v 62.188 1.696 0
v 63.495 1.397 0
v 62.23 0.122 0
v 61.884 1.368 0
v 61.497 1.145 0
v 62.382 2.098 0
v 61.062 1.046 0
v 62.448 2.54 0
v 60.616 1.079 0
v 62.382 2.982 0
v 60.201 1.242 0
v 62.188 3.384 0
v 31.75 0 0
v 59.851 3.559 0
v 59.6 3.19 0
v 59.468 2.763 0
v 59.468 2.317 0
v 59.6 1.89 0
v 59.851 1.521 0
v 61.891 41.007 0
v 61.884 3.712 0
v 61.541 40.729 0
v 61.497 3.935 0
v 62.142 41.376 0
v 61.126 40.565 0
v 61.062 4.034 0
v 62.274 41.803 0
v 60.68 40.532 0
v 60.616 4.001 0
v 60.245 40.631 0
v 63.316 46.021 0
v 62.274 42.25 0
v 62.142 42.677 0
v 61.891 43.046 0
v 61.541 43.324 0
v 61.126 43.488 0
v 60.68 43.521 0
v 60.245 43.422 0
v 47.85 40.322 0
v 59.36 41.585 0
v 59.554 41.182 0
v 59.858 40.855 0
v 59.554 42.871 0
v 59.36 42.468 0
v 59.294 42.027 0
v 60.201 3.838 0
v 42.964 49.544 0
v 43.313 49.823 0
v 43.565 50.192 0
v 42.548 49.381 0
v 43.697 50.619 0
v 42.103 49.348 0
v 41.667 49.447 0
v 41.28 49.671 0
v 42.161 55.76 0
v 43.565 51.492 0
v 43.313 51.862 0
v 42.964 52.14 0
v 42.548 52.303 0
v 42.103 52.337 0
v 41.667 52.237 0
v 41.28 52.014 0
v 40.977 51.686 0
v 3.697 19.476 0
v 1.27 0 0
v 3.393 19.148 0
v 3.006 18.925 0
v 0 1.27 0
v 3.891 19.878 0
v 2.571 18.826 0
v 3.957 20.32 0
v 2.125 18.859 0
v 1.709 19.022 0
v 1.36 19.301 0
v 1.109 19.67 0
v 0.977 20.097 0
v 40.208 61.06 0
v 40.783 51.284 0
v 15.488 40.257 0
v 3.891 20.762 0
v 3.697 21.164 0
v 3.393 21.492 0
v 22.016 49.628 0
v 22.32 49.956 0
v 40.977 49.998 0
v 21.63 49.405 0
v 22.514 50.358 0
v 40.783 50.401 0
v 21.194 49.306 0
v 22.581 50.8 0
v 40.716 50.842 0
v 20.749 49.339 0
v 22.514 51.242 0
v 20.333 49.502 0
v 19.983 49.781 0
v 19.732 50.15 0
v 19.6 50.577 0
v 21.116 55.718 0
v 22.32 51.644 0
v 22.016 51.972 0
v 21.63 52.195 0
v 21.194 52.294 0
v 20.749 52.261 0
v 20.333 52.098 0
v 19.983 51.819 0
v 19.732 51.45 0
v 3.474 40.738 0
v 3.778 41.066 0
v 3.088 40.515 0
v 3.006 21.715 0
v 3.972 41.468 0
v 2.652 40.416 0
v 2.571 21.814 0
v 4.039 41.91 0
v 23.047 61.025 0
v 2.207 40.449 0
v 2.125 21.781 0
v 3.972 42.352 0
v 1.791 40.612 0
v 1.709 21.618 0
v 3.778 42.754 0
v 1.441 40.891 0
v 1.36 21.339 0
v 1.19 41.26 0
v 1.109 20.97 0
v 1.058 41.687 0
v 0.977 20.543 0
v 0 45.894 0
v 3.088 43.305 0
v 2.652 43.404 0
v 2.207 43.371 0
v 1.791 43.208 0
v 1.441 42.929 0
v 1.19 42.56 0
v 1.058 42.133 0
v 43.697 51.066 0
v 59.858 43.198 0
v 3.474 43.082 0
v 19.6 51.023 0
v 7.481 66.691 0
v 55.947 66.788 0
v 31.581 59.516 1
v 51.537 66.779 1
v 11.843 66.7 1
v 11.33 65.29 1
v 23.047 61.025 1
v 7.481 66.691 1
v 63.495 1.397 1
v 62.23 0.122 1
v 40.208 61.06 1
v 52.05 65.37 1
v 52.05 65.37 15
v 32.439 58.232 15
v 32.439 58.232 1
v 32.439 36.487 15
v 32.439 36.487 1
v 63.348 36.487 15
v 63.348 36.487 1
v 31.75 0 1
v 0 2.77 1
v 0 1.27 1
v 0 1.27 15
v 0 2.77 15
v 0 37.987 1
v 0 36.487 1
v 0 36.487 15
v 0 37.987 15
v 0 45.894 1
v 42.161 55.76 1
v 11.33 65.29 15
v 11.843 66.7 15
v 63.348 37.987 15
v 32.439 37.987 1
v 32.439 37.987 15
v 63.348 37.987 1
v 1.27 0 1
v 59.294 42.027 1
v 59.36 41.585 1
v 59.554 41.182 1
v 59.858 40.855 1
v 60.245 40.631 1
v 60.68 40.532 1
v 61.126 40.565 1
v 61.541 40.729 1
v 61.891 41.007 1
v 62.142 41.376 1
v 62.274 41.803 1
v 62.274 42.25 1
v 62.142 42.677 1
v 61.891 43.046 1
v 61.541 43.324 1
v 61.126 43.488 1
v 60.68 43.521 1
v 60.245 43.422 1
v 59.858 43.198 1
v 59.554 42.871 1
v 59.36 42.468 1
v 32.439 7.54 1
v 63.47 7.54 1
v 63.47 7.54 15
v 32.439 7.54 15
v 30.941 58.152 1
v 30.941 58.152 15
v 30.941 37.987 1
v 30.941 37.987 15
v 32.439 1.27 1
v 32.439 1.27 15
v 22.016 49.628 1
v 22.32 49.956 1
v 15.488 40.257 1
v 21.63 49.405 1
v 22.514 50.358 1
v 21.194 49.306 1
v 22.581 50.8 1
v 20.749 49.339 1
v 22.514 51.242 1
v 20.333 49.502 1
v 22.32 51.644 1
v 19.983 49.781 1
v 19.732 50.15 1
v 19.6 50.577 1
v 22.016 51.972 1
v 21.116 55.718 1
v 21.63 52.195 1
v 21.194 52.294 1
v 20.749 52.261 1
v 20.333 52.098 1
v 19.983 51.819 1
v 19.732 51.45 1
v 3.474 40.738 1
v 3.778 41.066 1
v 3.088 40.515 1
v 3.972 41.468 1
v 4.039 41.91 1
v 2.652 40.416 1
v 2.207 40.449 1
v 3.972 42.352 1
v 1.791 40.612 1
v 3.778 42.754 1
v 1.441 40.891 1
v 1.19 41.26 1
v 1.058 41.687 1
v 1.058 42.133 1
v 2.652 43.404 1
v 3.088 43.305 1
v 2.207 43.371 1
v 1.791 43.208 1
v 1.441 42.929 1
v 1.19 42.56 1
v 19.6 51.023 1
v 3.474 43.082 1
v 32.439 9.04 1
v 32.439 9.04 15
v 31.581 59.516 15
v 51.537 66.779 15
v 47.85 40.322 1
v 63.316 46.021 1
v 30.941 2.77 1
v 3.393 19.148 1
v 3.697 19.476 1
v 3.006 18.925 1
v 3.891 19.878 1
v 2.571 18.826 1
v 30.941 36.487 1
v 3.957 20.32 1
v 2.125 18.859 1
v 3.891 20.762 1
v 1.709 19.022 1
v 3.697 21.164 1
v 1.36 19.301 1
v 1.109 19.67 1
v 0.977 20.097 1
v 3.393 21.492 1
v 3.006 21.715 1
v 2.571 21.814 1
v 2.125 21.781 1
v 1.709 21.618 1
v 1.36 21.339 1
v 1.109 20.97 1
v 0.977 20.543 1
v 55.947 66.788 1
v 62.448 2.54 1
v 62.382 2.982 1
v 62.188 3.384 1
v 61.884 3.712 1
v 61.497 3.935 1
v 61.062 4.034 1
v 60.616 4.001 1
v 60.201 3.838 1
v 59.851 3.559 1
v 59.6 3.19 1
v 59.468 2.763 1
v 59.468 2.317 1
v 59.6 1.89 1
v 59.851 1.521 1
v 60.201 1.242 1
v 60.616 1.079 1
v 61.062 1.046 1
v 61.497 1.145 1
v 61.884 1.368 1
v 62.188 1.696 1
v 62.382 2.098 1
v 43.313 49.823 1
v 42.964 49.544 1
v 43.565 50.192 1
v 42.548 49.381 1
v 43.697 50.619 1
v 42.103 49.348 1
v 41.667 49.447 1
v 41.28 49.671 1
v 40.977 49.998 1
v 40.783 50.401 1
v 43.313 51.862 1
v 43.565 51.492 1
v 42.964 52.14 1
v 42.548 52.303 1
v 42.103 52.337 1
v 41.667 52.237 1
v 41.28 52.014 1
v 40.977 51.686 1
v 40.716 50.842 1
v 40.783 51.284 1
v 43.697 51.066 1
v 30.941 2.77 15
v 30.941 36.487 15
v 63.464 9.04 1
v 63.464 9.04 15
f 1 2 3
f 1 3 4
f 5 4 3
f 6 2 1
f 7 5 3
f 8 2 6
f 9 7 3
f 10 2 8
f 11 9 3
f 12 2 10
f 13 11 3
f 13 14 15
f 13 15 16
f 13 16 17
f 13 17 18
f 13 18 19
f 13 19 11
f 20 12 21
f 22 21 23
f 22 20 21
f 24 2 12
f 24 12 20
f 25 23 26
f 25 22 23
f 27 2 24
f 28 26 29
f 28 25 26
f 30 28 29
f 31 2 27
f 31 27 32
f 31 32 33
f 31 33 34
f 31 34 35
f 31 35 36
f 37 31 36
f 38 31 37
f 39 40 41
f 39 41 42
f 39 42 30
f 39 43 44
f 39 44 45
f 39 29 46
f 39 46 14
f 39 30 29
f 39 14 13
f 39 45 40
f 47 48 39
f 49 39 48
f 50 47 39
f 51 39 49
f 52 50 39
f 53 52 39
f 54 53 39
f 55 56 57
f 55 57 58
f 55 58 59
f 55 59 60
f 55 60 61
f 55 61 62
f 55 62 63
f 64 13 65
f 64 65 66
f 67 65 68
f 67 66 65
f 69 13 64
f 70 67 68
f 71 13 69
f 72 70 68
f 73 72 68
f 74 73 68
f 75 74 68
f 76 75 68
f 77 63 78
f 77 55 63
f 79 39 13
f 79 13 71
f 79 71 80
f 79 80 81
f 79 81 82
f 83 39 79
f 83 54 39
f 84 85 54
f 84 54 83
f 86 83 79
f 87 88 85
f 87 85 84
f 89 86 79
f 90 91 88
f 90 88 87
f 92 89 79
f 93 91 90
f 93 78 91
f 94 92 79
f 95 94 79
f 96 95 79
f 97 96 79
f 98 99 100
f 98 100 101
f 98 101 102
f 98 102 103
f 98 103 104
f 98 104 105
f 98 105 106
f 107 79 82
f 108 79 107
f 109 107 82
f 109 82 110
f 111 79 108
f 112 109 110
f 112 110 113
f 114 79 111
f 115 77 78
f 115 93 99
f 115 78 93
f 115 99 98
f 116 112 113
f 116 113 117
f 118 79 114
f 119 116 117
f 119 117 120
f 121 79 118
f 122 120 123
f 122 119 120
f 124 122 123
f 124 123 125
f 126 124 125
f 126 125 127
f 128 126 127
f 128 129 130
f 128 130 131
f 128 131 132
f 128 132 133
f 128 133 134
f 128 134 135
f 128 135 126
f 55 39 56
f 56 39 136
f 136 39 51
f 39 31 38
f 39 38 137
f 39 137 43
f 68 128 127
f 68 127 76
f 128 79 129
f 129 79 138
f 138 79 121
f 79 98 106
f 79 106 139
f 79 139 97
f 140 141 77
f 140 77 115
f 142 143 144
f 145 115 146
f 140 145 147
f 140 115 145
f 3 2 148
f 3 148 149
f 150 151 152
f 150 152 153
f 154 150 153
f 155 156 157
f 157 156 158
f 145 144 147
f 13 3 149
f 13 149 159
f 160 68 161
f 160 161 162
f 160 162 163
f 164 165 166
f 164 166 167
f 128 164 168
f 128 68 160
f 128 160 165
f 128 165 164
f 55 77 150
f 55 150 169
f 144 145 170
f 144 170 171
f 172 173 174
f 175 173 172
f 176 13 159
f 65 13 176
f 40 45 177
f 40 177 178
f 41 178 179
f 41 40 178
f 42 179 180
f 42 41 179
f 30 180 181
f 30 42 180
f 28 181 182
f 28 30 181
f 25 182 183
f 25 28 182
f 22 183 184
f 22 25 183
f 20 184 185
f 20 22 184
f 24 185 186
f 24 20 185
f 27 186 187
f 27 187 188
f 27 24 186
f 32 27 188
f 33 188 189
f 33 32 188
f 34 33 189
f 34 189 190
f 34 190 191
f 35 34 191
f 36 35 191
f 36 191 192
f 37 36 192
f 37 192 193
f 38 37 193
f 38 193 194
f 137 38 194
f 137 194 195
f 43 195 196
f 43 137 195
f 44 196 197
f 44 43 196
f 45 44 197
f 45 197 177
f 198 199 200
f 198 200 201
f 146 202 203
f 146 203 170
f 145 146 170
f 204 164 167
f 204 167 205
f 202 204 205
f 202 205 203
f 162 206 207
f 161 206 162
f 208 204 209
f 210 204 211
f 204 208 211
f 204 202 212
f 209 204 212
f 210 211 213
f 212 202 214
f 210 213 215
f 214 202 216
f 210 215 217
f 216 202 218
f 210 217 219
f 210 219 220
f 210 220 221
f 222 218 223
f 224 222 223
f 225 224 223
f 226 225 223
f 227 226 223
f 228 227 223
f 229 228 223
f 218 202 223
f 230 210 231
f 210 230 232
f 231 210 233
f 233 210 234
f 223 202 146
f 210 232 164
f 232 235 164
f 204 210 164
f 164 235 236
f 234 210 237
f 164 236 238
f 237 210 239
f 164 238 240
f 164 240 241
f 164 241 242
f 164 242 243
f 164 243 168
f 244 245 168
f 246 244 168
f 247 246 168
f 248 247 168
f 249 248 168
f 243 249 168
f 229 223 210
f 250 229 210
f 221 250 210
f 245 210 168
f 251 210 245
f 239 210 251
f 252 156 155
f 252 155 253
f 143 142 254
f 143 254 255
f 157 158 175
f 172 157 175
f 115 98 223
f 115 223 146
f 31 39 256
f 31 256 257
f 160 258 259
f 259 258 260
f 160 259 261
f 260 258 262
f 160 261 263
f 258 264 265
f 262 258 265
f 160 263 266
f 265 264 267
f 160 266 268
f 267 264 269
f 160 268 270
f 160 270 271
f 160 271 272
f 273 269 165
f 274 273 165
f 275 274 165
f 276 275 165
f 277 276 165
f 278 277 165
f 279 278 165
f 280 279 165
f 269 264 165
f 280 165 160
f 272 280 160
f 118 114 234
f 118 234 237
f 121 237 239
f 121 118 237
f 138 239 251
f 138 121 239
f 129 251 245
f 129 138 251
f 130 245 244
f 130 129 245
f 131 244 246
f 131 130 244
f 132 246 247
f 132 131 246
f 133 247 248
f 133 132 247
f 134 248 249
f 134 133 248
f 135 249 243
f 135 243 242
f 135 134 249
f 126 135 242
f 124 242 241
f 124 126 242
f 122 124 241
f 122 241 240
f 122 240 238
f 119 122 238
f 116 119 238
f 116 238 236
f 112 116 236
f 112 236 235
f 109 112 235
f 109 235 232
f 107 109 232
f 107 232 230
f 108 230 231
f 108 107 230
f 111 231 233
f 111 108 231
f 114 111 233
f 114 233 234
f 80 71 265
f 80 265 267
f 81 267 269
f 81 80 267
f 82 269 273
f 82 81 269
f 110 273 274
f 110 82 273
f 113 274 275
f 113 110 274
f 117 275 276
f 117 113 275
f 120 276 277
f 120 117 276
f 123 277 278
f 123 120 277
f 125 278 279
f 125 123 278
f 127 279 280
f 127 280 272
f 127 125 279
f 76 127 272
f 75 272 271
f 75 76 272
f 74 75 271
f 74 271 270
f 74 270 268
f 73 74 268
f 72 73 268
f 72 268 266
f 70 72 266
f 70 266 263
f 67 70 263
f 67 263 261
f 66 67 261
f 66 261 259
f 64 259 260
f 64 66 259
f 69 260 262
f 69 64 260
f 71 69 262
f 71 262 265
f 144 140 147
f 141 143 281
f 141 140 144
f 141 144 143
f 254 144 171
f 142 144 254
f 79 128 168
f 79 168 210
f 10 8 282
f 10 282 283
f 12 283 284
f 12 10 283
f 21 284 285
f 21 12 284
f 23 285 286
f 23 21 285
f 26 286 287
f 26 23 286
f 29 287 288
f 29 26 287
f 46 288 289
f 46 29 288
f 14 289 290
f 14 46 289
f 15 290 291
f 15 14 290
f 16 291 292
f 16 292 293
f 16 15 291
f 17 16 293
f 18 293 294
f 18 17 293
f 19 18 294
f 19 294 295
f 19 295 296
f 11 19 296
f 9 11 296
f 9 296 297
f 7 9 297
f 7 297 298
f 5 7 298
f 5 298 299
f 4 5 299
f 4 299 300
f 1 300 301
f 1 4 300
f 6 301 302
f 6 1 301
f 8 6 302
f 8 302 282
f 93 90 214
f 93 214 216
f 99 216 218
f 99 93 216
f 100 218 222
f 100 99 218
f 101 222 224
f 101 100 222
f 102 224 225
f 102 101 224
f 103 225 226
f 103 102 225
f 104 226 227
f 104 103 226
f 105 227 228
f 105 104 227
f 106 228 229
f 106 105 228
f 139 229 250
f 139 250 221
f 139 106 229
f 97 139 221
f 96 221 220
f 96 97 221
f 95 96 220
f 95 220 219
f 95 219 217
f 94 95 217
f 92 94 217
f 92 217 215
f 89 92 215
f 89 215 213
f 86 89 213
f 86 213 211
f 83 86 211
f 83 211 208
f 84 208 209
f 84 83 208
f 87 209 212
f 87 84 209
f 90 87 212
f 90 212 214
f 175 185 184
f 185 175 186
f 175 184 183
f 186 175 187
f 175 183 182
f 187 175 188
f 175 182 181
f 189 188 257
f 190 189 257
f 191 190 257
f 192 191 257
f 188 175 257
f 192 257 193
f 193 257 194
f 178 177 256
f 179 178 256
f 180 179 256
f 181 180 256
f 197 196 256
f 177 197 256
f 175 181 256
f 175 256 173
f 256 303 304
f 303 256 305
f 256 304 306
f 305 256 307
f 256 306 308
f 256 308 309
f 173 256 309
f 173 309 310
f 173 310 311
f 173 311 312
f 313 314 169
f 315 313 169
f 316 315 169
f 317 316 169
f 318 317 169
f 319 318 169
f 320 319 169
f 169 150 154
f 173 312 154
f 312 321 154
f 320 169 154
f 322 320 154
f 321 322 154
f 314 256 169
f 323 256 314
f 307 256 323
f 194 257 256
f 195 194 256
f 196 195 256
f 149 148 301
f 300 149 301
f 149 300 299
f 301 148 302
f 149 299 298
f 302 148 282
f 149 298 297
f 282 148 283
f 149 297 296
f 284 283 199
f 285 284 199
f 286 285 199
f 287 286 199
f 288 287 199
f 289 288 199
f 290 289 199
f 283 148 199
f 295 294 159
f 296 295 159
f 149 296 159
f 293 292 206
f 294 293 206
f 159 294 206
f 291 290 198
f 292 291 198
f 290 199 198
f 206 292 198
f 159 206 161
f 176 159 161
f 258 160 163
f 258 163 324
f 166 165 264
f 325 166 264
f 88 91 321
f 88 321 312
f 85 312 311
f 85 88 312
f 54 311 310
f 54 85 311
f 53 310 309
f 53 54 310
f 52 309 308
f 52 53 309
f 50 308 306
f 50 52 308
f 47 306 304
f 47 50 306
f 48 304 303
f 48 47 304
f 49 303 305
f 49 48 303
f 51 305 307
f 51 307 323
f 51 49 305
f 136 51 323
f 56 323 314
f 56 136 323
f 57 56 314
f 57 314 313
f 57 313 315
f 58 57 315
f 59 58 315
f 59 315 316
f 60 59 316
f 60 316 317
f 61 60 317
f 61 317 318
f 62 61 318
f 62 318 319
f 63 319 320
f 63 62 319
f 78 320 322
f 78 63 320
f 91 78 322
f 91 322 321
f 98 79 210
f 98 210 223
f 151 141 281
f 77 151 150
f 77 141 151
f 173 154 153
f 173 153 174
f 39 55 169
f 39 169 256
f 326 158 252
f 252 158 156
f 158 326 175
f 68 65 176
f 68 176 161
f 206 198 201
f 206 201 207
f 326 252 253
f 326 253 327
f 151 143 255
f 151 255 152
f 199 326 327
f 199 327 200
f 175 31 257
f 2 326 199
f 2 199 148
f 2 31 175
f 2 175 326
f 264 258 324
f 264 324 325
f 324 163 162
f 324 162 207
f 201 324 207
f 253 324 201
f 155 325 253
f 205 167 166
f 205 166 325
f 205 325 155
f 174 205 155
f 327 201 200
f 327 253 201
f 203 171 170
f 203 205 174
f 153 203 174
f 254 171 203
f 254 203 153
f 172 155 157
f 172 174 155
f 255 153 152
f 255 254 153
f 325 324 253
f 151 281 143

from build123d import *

# Parameters (mm, degrees)
SKETCH9_R           = 1.4986
BOSS_EXTRUDE2_DEPTH = 1
BOSS_EXTRUDE8_DEPTH = 1
BOSS_EXTRUDE3_DEPTH = 14
SKETCH12_W          = 63.348303519
SKETCH12_H          = 1.5
BOSS_EXTRUDE4_DEPTH = 14


with BuildPart() as part:
    # Sketch9 → Boss-Extrude2 (new body)
    with BuildSketch(Plane.XY):
        Polygon((0, 45.894331692), (15.488494665, 40.257085472), (21.11579715, 55.718259441), (31.638563481, 55.718259441), (42.161245631, 55.760350338), (47.850347546, 40.321809178), (63.316169409, 46.020964031), (63.494666021, 1.396989332), (62.229756161, 0.121919512), (31.75, 0), (1.27, 0), (0, 1.27), align=None)
        with Locations((60.94984, 2.54)):
            Circle(SKETCH9_R, mode=Mode.SUBTRACT)
        with Locations((21.082, 50.8)):
            Circle(SKETCH9_R, mode=Mode.SUBTRACT)
        with Locations((2.54, 41.91)):
            Circle(SKETCH9_R, mode=Mode.SUBTRACT)
        with Locations(Location((60.792126991, 42.026504254, 0), (0, 0, 180))):
            Circle(SKETCH9_R, mode=Mode.SUBTRACT)
        with Locations(Location((42.214715469, 50.842265431, 0), (0, 0, 180))):
            Circle(SKETCH9_R, mode=Mode.SUBTRACT)
        with Locations((2.45872, 20.32)):
            Circle(SKETCH9_R, mode=Mode.SUBTRACT)
    extrude(amount=BOSS_EXTRUDE2_DEPTH)

    # Sketch13 → Boss-Extrude8 (add)
    with BuildSketch(Plane(origin=(0, 0, 0), x_dir=(-1, 0, 0), z_dir=(0, 0, -1))):
        Polygon((-21.11579715, 55.718259441), (-23.047346454, 61.025246209), (-7.480797331, 66.691011442), (-55.947053109, 66.787943953), (-40.208483916, 61.059568484), (-42.161245631, 55.760350338), (-27.798035754, 50.098344964), align=None)
    extrude(amount=-BOSS_EXTRUDE8_DEPTH)

    # Sketch11 → Boss-Extrude3 (add)
    with BuildSketch(Plane.XY.offset(1)):
        Polygon((32.438774093, 58.231623033), (32.438774093, 9.039988), (63.464093904, 9.039988), (63.47009388, 7.54), (32.438774093, 7.54), (32.438774093, 1.27), (0, 1.27), (0, 2.77), (30.940876447, 2.77), (30.940876447, 58.152233865), (11.329502605, 65.290196119), (11.842533196, 66.699734913), (31.580765387, 59.515599958), (51.537117344, 66.779124082), (52.050147935, 65.369585287), align=None)
    extrude(amount=BOSS_EXTRUDE3_DEPTH)

    # Sketch12 → Boss-Extrude4 (add)
    with BuildSketch(Plane.XY.offset(1)):
        with Locations((31.67415176, 37.237468453)):
            Rectangle(SKETCH12_W, SKETCH12_H)
    extrude(amount=BOSS_EXTRUDE4_DEPTH)


solid = part.part
